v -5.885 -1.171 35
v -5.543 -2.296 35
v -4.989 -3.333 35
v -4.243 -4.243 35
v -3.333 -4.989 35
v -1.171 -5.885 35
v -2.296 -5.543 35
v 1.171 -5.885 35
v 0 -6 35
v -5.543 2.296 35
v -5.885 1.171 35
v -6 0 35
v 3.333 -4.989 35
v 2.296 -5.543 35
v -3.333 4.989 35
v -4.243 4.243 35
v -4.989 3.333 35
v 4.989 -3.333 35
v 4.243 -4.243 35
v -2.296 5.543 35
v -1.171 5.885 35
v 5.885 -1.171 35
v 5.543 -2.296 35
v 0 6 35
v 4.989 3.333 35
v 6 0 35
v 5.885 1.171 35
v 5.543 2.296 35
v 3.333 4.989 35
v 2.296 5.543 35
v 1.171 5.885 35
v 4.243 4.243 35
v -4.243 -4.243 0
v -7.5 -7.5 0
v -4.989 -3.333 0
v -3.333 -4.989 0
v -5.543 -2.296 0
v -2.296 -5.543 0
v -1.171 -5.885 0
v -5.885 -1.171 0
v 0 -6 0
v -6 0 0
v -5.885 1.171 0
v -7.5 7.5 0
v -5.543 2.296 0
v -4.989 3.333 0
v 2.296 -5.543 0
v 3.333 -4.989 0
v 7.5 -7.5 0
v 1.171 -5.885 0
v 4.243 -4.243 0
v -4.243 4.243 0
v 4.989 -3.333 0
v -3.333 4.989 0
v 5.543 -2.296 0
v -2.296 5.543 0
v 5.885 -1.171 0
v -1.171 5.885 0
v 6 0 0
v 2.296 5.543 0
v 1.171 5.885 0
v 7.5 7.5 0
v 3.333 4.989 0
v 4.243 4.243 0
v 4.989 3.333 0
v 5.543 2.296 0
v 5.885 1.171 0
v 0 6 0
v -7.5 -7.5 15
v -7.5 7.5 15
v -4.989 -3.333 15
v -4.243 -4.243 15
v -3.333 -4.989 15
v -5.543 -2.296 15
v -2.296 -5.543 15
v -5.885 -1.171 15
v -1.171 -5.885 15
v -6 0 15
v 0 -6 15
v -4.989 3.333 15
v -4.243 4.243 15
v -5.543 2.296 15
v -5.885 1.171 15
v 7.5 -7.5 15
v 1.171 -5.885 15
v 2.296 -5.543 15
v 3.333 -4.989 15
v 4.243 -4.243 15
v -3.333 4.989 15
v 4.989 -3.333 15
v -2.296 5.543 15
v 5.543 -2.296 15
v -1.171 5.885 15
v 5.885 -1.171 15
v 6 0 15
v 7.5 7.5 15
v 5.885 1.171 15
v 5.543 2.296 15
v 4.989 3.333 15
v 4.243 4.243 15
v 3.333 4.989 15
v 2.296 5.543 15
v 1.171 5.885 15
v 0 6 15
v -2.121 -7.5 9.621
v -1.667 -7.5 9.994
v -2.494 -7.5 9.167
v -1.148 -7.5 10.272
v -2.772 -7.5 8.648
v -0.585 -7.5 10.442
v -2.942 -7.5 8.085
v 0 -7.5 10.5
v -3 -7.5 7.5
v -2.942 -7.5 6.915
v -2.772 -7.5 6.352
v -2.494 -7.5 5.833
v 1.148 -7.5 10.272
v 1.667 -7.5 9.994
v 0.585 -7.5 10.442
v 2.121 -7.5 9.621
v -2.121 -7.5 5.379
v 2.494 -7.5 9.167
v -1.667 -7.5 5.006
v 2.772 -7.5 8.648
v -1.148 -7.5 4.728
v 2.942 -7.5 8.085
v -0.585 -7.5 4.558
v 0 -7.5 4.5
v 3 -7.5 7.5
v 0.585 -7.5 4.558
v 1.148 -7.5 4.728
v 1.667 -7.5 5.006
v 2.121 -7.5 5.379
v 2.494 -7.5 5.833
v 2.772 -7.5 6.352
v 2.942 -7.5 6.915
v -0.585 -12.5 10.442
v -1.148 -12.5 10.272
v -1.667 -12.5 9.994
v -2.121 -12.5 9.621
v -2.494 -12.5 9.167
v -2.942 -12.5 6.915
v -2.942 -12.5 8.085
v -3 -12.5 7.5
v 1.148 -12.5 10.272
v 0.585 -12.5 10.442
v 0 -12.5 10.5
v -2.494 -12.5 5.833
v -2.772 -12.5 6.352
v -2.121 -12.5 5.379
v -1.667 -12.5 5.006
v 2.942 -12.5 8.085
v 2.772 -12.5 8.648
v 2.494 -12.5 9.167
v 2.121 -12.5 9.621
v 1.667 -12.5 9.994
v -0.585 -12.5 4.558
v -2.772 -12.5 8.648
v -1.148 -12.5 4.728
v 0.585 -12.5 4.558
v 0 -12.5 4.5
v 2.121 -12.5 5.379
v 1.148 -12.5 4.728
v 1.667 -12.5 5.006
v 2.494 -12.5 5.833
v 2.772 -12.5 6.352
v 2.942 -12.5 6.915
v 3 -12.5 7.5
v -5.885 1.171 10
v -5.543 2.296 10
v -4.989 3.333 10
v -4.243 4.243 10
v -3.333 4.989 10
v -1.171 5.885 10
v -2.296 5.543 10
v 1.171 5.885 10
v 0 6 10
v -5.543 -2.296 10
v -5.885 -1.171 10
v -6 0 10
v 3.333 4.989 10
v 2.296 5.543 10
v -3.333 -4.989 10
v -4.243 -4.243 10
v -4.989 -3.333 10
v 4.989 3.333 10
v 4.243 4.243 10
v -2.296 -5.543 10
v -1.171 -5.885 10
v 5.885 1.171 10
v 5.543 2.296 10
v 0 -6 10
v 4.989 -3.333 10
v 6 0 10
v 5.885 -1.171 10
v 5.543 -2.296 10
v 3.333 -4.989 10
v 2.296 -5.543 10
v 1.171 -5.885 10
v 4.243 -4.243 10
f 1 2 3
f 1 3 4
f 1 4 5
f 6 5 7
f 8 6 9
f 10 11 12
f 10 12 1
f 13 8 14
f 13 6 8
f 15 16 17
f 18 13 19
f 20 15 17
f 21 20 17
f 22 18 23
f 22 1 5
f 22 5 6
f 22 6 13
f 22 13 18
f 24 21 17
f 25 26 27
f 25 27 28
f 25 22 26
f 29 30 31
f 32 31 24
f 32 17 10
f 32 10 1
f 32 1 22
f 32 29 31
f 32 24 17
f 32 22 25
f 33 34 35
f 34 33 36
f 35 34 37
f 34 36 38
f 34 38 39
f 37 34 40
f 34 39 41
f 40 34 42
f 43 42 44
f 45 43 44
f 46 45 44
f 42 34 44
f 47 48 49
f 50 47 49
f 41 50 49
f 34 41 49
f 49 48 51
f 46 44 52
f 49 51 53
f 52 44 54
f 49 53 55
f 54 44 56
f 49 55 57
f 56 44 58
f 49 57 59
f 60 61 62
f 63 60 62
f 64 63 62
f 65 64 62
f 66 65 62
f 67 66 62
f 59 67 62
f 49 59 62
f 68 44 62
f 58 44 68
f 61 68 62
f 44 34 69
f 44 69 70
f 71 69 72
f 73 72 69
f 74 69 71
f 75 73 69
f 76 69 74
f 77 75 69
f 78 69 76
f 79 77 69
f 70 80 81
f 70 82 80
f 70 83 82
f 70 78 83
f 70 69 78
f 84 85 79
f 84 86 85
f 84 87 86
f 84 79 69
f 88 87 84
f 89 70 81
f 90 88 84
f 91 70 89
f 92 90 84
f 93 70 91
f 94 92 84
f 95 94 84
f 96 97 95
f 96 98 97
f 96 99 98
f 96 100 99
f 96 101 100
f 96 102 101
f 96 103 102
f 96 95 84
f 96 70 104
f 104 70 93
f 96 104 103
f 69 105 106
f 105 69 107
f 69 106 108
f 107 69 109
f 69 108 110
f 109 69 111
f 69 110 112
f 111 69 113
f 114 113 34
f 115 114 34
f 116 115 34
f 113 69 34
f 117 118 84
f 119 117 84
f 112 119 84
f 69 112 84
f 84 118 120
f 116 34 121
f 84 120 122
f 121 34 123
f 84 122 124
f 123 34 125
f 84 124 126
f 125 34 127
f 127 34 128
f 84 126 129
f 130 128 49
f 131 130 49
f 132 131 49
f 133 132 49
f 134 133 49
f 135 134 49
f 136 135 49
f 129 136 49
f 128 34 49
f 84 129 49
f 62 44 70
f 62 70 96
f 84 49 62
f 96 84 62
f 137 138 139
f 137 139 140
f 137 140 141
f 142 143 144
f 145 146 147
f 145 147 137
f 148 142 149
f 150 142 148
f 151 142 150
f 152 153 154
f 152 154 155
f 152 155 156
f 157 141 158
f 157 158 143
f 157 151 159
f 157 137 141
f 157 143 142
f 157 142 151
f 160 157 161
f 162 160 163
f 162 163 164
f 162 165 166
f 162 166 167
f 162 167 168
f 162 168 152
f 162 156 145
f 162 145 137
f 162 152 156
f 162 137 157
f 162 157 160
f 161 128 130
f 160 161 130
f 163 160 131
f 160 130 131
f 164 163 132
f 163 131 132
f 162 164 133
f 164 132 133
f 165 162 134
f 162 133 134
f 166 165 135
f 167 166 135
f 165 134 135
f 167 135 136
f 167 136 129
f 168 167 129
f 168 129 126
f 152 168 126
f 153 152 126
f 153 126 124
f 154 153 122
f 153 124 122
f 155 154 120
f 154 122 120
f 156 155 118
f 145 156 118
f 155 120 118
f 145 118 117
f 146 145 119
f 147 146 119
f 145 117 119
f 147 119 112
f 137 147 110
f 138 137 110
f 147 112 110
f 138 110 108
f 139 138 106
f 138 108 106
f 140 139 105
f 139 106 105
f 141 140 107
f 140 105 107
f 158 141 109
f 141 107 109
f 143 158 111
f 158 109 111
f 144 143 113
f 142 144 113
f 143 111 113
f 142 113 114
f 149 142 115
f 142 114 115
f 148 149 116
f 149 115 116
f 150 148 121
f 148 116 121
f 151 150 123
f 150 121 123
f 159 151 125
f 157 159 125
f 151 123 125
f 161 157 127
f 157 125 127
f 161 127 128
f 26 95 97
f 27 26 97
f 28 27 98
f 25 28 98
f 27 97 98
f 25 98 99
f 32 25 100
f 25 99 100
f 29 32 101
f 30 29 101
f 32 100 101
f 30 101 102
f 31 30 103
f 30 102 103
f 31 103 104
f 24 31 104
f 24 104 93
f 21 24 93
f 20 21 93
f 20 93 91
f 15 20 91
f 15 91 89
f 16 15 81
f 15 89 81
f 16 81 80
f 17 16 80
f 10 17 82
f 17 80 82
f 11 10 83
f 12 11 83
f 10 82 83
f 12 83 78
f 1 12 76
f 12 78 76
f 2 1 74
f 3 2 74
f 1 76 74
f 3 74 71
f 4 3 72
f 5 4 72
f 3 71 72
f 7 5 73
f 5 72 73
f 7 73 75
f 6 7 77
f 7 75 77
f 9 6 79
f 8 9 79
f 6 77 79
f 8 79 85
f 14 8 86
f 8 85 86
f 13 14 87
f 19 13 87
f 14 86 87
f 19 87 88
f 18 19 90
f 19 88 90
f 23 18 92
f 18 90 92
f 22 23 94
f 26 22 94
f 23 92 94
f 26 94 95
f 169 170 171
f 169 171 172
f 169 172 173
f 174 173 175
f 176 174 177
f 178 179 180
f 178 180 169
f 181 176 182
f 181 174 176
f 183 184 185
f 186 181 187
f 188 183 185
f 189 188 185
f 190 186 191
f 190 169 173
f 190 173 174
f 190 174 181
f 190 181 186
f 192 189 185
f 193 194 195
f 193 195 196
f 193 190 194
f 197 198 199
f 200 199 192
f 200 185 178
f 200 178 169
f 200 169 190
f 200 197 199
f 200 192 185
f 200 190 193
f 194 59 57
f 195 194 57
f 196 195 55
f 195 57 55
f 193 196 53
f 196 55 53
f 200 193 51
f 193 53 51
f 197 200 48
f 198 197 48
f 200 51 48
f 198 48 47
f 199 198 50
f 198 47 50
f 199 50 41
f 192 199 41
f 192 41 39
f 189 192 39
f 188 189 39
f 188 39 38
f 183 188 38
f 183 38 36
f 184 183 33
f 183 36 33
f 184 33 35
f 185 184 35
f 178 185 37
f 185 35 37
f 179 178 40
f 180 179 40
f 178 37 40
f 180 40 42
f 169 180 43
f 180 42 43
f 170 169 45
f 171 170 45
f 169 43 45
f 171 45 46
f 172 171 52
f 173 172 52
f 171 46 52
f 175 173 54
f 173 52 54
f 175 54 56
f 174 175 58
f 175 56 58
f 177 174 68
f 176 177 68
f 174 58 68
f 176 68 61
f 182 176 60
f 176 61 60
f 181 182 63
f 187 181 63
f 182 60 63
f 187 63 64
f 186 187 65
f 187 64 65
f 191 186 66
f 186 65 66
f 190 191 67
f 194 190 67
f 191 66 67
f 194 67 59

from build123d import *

# Parameters (mm, degrees)
SKETCH1_W           = 15
SKETCH1_H           = 15
BOSS_EXTRUDE1_DEPTH = 15
SKETCH2_R           = 6
BOSS_EXTRUDE2_DEPTH = 20
SKETCH3_R           = 6
CUT_EXTRUDE1_DEPTH  = 10
SKETCH4_R           = 3
BOSS_EXTRUDE3_DEPTH = 5


with BuildPart() as part:
    # Sketch1 → Boss-Extrude1 (new body)
    with BuildSketch(Plane.XY):
        Rectangle(SKETCH1_W, SKETCH1_H)
    extrude(amount=BOSS_EXTRUDE1_DEPTH)

    # Sketch2 → Boss-Extrude2 (add)
    with BuildSketch(Plane.XY.offset(15)):
        Circle(SKETCH2_R)
    extrude(amount=BOSS_EXTRUDE2_DEPTH)

    # Sketch3 → Cut-Extrude1 (cut)
    with BuildSketch(Plane(origin=(0, 0, 0), x_dir=(-1, 0, 0), z_dir=(0, 0, -1))):
        with Locations(Location((0, 0, 0), (0, 0, 180))):
            Circle(SKETCH3_R)
    extrude(amount=-CUT_EXTRUDE1_DEPTH, mode=Mode.SUBTRACT)

    # Sketch4 → Boss-Extrude3 (add)
    with BuildSketch(Plane.XZ.offset(7.5)):
        with Locations(Location((0, 7.5, 0), (0, 0, 270))):
            Circle(SKETCH4_R)
    extrude(amount=BOSS_EXTRUDE3_DEPTH)


solid = part.part
